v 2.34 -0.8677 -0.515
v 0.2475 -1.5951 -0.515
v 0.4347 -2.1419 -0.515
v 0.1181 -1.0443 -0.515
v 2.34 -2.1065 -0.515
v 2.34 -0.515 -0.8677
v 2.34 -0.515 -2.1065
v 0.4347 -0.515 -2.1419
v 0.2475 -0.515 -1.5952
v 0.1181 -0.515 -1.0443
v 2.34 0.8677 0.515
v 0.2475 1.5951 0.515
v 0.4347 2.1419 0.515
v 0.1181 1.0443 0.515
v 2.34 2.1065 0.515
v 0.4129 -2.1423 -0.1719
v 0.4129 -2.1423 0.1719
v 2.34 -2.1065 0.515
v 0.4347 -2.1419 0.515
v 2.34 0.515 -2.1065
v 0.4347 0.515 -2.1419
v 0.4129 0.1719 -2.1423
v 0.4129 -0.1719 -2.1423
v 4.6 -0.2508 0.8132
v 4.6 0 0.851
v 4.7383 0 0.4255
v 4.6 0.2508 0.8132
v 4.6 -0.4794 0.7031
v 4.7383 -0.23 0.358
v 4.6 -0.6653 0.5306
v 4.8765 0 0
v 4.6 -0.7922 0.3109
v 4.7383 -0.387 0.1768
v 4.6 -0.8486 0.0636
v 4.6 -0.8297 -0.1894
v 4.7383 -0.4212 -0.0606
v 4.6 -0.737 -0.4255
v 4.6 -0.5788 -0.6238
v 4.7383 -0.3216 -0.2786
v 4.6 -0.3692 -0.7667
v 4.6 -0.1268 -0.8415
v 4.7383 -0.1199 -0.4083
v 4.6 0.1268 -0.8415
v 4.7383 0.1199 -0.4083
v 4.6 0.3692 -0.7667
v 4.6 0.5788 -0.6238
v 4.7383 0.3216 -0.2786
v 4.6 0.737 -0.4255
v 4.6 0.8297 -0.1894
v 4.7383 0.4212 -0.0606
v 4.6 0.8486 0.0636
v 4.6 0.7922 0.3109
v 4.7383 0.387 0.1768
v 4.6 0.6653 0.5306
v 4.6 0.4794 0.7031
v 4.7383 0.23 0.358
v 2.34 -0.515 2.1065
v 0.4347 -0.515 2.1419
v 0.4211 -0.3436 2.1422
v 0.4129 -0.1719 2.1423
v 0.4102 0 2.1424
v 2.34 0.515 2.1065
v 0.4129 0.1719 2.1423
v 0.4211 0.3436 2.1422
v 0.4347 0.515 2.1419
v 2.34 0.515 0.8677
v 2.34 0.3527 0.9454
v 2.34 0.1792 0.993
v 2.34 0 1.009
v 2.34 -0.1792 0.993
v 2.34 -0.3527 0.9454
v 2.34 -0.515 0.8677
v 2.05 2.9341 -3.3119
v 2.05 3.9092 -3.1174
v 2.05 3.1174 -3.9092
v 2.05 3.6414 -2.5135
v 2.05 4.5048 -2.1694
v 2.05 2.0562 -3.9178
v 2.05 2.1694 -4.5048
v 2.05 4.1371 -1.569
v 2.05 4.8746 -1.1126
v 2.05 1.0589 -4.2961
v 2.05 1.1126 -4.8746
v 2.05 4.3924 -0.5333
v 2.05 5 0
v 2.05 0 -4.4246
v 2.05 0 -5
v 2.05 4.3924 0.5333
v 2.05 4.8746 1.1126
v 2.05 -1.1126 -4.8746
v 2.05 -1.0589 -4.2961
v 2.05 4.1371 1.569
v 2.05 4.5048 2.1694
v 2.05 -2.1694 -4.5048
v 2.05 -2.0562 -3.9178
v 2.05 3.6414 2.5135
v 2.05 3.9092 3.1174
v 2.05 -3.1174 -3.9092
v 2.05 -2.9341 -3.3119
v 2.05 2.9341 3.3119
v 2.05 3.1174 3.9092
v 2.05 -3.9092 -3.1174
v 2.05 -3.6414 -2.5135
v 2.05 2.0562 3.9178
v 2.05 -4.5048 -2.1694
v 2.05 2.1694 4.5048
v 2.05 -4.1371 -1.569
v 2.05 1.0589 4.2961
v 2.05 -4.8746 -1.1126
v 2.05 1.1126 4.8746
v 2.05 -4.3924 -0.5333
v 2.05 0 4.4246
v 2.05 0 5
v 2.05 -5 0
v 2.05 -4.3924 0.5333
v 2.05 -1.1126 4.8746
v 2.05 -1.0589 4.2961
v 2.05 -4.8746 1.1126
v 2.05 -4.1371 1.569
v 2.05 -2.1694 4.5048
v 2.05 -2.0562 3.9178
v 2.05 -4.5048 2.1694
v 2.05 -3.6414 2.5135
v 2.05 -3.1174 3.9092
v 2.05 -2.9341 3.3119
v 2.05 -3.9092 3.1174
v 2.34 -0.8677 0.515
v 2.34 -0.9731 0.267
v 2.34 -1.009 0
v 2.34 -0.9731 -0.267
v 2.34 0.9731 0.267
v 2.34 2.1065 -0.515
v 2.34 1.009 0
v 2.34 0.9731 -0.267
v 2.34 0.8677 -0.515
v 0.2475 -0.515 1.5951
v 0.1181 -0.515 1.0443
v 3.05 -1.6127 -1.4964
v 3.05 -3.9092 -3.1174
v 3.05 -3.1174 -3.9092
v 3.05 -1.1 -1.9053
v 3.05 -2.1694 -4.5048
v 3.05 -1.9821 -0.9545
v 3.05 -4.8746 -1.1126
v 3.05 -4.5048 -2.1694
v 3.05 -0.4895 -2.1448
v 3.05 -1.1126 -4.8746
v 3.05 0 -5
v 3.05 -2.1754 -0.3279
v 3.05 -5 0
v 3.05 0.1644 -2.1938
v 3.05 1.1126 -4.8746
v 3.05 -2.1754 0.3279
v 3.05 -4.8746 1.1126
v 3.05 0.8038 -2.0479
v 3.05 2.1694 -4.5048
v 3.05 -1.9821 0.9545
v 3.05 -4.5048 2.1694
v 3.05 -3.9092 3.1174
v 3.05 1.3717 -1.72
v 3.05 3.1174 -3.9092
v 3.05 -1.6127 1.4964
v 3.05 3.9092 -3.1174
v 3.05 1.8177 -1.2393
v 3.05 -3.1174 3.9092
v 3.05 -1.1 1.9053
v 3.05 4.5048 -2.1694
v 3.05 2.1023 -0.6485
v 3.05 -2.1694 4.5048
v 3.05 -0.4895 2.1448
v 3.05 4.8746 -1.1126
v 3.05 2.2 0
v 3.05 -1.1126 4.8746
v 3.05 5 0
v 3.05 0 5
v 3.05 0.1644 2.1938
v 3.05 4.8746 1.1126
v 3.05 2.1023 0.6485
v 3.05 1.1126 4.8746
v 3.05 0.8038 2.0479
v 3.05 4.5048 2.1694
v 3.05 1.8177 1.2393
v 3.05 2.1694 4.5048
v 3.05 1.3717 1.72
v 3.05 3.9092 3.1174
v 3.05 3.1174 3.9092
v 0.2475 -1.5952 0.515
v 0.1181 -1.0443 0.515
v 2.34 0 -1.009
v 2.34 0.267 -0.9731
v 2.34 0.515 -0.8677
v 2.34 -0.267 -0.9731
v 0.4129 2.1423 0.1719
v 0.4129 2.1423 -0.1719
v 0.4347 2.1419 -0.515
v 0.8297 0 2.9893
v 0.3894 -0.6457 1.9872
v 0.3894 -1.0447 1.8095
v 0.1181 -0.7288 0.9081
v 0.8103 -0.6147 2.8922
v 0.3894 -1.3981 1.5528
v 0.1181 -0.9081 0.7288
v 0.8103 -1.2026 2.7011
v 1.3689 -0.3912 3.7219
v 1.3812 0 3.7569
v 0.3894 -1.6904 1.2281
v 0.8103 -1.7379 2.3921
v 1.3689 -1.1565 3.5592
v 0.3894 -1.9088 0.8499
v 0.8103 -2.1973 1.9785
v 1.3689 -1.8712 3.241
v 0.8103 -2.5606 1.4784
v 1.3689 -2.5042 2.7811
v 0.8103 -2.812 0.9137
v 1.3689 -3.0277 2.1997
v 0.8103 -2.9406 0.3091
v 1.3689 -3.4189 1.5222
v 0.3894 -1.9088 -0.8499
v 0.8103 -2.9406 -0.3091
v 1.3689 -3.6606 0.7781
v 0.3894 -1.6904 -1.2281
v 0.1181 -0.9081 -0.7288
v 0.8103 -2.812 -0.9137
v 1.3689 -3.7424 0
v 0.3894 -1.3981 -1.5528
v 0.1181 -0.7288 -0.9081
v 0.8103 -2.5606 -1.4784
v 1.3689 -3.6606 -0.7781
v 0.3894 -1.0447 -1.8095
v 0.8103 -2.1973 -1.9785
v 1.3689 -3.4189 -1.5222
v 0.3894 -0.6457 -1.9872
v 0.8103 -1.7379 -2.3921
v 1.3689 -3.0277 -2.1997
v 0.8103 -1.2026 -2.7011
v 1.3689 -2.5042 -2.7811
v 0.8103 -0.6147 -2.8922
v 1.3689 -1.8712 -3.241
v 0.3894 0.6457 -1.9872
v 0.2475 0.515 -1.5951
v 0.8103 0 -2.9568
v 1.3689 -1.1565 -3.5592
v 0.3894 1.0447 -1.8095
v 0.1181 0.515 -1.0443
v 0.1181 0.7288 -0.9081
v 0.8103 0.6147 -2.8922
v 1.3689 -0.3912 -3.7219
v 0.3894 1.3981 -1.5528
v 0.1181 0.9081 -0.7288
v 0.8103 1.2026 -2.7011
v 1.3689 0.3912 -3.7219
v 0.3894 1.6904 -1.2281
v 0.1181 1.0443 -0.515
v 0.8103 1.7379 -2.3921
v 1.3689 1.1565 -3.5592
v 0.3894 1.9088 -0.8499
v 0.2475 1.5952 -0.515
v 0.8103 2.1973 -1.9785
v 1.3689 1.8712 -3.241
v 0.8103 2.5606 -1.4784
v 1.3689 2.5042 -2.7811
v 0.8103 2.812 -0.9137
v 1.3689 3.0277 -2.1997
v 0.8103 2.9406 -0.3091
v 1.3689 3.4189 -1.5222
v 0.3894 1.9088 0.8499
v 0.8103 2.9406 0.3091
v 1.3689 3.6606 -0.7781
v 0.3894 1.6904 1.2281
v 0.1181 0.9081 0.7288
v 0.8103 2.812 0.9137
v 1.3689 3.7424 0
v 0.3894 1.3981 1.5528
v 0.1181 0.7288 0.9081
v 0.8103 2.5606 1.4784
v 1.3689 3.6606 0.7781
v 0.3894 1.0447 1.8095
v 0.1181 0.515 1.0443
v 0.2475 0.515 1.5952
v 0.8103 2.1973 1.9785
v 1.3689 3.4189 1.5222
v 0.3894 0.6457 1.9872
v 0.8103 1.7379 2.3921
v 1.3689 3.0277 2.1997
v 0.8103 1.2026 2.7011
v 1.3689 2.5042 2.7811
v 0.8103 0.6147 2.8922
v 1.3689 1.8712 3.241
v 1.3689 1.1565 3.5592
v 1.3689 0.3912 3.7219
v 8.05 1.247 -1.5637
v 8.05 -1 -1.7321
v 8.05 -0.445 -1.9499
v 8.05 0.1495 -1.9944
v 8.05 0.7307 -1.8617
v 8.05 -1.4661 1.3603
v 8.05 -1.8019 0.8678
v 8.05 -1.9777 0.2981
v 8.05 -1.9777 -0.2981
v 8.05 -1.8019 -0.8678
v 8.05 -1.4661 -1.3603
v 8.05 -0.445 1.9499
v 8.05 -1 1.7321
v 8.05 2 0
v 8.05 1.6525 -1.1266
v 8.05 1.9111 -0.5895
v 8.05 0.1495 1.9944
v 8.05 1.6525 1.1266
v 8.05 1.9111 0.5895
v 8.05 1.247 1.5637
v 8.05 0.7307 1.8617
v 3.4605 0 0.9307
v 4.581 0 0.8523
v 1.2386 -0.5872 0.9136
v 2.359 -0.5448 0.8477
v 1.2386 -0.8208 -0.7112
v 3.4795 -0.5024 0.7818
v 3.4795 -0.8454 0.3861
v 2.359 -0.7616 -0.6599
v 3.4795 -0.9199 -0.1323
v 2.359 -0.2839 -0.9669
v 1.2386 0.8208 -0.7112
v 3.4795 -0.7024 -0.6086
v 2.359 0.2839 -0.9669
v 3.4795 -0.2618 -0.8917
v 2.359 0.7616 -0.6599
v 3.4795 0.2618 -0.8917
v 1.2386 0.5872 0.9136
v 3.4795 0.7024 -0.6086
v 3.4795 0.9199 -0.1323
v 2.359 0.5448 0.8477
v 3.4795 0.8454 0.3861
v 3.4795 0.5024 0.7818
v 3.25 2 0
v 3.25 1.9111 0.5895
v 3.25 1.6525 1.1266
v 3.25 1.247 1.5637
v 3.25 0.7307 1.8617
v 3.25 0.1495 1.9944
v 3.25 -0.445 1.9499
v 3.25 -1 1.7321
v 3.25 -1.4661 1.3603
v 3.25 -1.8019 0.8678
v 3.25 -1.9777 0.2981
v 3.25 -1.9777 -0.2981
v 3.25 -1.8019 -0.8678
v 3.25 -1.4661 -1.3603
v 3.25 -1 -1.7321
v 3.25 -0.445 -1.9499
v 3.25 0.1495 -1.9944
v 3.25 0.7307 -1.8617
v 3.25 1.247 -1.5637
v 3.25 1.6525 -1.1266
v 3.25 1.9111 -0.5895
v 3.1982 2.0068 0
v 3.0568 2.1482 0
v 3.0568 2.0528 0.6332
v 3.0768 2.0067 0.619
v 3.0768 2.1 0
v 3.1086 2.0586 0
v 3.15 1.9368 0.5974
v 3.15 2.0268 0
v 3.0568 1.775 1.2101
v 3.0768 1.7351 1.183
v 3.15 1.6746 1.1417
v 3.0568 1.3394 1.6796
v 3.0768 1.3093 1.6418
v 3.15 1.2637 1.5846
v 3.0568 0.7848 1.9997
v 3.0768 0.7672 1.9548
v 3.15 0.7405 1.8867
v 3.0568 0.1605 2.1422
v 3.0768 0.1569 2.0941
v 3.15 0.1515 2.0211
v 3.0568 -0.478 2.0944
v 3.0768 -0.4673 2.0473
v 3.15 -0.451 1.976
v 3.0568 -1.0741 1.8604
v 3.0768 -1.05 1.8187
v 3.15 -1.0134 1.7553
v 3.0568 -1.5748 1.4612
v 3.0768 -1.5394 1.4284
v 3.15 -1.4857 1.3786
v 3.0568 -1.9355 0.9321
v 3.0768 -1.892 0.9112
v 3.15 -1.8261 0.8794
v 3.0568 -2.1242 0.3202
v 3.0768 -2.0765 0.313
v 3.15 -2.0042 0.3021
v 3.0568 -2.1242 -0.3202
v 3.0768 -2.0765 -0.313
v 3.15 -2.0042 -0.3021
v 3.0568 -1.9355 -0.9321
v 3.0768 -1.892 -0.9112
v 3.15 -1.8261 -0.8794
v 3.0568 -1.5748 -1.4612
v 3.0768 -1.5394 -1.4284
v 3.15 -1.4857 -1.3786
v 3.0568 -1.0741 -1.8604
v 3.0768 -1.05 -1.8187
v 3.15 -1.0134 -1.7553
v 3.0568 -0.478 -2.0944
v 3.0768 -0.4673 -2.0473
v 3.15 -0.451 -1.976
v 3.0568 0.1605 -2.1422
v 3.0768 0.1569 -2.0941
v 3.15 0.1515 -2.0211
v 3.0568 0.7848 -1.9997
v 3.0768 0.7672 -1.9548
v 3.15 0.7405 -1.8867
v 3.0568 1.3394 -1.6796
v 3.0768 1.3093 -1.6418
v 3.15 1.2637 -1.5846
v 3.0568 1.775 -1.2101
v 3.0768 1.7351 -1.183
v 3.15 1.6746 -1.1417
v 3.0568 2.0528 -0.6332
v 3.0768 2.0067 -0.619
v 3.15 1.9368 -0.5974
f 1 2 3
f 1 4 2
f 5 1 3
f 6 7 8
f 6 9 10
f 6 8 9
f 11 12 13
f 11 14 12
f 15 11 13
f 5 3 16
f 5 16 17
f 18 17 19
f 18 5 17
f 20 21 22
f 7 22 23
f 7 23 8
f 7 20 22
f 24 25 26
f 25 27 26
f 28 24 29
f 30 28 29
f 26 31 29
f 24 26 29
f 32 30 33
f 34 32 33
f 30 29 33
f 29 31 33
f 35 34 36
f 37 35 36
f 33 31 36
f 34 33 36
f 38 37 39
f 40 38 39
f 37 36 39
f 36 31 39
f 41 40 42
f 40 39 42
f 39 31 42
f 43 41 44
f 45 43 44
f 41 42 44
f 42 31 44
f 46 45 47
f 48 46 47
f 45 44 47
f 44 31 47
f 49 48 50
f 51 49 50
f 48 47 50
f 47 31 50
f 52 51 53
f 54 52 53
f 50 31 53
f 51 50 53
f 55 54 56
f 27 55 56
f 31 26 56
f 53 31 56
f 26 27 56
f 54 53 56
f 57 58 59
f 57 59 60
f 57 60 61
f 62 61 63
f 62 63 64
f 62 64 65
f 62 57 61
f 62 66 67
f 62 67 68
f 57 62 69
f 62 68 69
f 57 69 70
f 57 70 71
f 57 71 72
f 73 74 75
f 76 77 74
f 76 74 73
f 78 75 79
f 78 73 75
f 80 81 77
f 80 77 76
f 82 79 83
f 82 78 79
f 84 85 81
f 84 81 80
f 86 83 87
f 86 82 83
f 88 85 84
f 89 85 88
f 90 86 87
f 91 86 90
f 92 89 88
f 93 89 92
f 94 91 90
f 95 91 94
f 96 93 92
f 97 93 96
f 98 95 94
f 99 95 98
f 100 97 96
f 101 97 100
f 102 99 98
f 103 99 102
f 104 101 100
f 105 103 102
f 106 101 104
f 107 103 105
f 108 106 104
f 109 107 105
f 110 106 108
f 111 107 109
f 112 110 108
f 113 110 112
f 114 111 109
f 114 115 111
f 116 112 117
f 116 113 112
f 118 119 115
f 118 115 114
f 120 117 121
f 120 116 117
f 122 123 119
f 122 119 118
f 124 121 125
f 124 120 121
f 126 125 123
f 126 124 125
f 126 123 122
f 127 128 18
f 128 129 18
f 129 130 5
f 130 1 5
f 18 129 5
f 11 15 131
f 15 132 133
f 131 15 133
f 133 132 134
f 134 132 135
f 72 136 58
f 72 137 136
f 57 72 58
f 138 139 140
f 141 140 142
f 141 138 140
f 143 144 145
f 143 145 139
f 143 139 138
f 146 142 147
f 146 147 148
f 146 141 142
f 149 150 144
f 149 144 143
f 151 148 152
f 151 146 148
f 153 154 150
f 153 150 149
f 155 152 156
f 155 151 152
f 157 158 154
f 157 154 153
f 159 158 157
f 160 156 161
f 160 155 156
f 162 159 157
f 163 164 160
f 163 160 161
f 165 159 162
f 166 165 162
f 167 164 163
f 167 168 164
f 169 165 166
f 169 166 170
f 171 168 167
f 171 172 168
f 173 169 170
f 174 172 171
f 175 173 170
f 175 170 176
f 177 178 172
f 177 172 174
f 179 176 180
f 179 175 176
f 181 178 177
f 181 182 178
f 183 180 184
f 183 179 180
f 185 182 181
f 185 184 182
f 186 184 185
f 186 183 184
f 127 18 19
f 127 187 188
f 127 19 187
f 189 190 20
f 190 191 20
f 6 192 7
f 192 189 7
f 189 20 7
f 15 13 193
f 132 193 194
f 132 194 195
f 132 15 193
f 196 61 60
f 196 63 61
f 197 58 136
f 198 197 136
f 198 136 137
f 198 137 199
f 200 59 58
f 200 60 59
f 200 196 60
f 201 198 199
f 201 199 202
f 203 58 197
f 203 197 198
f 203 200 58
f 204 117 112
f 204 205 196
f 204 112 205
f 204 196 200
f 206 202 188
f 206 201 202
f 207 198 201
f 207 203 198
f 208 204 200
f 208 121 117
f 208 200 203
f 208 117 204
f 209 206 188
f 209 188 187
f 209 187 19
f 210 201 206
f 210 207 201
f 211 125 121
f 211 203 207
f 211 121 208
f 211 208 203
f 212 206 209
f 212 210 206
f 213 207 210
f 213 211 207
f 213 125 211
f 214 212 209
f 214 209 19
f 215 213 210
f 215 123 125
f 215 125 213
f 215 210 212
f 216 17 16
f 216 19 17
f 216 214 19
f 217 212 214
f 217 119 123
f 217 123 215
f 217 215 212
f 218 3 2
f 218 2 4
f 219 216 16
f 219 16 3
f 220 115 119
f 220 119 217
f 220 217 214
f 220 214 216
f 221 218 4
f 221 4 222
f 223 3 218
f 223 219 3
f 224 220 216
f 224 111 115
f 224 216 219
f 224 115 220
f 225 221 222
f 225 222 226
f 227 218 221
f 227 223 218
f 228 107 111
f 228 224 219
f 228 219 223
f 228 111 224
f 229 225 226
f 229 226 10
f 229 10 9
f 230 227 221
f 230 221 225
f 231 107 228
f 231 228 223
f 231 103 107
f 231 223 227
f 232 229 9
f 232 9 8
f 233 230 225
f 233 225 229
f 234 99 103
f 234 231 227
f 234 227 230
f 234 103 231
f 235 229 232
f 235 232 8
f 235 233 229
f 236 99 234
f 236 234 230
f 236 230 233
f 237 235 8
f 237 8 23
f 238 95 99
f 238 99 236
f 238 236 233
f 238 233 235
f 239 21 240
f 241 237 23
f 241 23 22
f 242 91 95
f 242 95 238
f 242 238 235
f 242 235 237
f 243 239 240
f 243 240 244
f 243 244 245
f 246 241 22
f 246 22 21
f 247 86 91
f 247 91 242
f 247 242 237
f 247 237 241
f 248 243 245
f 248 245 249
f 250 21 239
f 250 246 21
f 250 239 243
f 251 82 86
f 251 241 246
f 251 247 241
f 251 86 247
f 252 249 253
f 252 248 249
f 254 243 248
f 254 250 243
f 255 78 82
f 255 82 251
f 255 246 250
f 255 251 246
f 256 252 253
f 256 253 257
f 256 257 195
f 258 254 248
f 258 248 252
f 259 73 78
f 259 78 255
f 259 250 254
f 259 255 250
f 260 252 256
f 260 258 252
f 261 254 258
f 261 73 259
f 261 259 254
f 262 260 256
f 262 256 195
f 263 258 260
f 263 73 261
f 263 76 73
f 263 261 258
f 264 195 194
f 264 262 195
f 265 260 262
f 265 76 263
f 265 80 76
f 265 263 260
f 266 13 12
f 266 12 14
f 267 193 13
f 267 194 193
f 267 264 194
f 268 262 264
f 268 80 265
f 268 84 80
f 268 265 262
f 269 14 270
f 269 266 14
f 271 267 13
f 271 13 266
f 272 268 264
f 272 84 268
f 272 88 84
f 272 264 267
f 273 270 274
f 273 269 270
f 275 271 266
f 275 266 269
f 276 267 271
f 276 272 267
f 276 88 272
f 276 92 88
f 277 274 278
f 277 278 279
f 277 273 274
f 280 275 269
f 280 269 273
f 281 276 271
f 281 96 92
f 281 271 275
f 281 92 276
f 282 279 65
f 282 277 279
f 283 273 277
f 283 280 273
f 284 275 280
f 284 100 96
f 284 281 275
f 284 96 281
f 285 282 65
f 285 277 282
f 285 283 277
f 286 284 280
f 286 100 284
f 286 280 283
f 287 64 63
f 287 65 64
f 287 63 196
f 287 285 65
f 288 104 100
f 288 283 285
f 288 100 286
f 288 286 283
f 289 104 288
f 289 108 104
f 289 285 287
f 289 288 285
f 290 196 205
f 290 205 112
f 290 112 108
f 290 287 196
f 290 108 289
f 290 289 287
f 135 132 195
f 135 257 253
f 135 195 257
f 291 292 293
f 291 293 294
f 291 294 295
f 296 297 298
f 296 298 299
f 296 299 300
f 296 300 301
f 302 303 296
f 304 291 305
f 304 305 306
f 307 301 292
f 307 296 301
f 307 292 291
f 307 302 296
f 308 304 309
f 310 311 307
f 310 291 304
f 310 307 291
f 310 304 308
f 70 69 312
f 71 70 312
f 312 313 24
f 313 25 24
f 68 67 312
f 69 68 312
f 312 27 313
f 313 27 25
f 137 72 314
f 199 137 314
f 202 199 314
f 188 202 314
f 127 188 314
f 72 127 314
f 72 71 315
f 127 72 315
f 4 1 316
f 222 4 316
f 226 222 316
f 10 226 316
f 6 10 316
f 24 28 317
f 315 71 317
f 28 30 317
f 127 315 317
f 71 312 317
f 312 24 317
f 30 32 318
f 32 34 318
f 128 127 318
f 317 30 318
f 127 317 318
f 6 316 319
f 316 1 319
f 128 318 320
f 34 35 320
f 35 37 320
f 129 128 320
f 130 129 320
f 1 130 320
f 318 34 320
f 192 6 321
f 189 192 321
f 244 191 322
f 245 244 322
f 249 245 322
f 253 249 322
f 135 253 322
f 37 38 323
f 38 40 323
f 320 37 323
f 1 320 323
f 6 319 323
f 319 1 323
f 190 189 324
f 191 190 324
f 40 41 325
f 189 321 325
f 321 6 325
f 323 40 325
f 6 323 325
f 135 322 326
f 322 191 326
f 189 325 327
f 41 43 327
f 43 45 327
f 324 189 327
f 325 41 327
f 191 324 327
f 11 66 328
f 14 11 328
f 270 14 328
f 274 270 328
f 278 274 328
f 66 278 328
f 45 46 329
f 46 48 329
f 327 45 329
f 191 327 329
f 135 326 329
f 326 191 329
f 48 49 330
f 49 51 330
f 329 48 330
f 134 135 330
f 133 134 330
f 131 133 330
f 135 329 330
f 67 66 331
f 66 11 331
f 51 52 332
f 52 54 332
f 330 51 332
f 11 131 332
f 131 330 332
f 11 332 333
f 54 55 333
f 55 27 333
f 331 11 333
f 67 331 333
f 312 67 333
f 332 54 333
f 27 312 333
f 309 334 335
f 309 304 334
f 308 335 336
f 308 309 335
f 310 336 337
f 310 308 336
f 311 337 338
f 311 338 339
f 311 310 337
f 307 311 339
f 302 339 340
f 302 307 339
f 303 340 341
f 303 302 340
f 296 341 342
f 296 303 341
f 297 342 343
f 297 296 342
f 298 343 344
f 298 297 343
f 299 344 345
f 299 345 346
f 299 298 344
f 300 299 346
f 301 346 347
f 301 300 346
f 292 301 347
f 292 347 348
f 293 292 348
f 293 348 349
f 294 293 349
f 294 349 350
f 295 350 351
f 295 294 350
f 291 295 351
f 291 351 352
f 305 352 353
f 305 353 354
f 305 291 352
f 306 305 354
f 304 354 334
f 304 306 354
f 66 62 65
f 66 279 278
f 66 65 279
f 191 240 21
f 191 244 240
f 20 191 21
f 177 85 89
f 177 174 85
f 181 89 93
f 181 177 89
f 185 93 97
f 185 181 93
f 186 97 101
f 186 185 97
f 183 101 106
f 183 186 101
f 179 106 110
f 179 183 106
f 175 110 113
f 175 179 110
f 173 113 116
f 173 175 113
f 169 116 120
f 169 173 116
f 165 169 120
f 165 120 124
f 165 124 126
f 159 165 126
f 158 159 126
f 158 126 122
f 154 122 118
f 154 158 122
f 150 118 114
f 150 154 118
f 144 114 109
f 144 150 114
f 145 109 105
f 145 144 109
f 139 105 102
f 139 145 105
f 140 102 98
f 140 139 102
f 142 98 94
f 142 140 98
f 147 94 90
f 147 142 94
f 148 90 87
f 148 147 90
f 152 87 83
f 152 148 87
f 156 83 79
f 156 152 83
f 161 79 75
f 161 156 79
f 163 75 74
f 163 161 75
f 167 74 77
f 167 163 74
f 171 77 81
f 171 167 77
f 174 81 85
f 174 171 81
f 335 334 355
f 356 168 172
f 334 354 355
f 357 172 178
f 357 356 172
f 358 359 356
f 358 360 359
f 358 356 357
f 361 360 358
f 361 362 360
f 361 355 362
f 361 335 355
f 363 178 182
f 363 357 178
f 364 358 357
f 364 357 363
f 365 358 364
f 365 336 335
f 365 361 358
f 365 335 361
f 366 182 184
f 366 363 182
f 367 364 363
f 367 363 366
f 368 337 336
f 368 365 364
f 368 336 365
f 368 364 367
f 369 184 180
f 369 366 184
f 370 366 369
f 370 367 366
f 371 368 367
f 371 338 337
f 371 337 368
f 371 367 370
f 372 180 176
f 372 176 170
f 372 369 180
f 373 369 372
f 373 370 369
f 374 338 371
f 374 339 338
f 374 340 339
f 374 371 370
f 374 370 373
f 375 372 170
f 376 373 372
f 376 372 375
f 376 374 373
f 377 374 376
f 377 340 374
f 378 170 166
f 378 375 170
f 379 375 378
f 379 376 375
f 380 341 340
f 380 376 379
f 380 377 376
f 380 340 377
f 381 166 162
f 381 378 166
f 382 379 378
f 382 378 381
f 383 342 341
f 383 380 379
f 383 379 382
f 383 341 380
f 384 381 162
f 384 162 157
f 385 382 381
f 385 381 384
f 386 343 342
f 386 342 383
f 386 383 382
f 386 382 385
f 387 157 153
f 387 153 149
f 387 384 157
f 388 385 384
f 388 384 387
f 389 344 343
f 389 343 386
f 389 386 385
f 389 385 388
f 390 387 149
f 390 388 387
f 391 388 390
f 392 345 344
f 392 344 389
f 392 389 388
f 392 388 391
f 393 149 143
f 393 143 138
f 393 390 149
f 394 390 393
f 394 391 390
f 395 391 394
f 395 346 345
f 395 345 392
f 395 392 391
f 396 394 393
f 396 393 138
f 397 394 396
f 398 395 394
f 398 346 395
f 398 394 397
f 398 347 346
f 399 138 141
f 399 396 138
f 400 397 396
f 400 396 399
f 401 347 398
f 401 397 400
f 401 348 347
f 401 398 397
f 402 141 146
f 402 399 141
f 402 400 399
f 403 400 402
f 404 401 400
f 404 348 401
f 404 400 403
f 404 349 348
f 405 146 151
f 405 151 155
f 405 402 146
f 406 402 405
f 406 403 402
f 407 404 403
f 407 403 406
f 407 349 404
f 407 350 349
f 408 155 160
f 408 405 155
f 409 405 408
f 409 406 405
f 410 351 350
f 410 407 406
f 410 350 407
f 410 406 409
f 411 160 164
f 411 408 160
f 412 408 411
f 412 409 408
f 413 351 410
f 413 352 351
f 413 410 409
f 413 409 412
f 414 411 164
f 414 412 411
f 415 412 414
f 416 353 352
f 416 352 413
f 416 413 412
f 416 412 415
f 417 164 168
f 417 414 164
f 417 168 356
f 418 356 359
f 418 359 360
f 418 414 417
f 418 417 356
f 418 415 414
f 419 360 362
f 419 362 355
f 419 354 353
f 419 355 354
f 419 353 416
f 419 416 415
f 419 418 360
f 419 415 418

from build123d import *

# Parameters (mm, degrees)
RECPAT_COUNT = 2
RECPAT_ANGLE = 90


with BuildPart() as part:
    # Fillet1: read off the stored shape, not the designer's step
    # Fillet1 outline → Fillet1 (revolve)
    with BuildSketch(Plane.YX):
        with BuildLine():
            Line((2, 3.25), (2, 8.05))
            Line((2, 8.05), (0, 8.05))
            Line((0, 8.05), (0, 2.05))
            Line((0, 2.05), (5, 2.05))
            Line((5, 2.05), (5, 3.05))
            Line((5, 3.05), (2.2, 3.05))
            ThreePointArc((2.2, 3.05), (2.058578644, 3.108578644), (2, 3.25))
        make_face()
    revolve(axis=Axis((0, 0, 0), (1, 0, 0)))

    # PanSke → Pan (revolve)
    with BuildSketch(Plane.XY, mode=Mode.PRIVATE) as pan_sk:
        with BuildLine():
            Line((2.05, 4.424646879), (2.05, 0))
            Line((2.05, 0), (0, 0))
            ThreePointArc((0, 0), (0.537396082, 2.438237068), (2.05, 4.424646879))
        make_face()
    revolve(pan_sk.sketch.rotate(Axis((0, 0, 0), (1, 0, 0)), 90), axis=Axis((0, 0, 0), (1, 0, 0)))

    # Sketch3 → Recess section 0
    with BuildSketch(Plane(origin=(0, 0, 0), x_dir=(0, 0, -1), z_dir=(1, 0, 0))):
        with BuildLine():
            Line((-0.515, 2.15), (0.515, 2.15))
            Line((0.515, 2.15), (0.515, -2.15))
            Line((0.515, -2.15), (-0.515, -2.15))
            Line((-0.515, -2.15), (-0.515, 2.15))
        make_face()
    # Sketch4 → Recess section 1
    with BuildSketch(Plane(origin=(2.34, 0, 0), x_dir=(0, 0, -1), z_dir=(1, 0, 0))):
        with BuildLine():
            Line((-0.515, 2.106524682), (0.515, 2.106524682))
            Line((0.515, 2.106524682), (0.515, -2.106524682))
            Line((0.515, -2.106524682), (-0.515, -2.106524682))
            Line((-0.515, -2.106524682), (-0.515, 2.106524682))
        make_face()
    recess = loft(mode=Mode.SUBTRACT)

    # RecPat: Recess ×2 about axis
    recpat_axis = Axis((0, 0, 0), (1, 0, 0))
    for i in range(1, RECPAT_COUNT):
        add(recess.rotate(recpat_axis, i * RECPAT_ANGLE / (RECPAT_COUNT - 1)), mode=Mode.SUBTRACT)

    # RecCorSke → RecessCore (revolve, cut)
    with BuildSketch(Plane.XY, mode=Mode.PRIVATE) as recesscore_sk:
        Polygon((0, 0), (0, 1.172663335), (4.6, 0.851), (4.876506661, 0), align=None)
    revolve(recesscore_sk.sketch.rotate(Axis((-3.175, 0, 0), (1, 0, 0)), 90), axis=Axis((-3.175, 0, 0), (1, 0, 0)), mode=Mode.SUBTRACT)


solid = part.part
